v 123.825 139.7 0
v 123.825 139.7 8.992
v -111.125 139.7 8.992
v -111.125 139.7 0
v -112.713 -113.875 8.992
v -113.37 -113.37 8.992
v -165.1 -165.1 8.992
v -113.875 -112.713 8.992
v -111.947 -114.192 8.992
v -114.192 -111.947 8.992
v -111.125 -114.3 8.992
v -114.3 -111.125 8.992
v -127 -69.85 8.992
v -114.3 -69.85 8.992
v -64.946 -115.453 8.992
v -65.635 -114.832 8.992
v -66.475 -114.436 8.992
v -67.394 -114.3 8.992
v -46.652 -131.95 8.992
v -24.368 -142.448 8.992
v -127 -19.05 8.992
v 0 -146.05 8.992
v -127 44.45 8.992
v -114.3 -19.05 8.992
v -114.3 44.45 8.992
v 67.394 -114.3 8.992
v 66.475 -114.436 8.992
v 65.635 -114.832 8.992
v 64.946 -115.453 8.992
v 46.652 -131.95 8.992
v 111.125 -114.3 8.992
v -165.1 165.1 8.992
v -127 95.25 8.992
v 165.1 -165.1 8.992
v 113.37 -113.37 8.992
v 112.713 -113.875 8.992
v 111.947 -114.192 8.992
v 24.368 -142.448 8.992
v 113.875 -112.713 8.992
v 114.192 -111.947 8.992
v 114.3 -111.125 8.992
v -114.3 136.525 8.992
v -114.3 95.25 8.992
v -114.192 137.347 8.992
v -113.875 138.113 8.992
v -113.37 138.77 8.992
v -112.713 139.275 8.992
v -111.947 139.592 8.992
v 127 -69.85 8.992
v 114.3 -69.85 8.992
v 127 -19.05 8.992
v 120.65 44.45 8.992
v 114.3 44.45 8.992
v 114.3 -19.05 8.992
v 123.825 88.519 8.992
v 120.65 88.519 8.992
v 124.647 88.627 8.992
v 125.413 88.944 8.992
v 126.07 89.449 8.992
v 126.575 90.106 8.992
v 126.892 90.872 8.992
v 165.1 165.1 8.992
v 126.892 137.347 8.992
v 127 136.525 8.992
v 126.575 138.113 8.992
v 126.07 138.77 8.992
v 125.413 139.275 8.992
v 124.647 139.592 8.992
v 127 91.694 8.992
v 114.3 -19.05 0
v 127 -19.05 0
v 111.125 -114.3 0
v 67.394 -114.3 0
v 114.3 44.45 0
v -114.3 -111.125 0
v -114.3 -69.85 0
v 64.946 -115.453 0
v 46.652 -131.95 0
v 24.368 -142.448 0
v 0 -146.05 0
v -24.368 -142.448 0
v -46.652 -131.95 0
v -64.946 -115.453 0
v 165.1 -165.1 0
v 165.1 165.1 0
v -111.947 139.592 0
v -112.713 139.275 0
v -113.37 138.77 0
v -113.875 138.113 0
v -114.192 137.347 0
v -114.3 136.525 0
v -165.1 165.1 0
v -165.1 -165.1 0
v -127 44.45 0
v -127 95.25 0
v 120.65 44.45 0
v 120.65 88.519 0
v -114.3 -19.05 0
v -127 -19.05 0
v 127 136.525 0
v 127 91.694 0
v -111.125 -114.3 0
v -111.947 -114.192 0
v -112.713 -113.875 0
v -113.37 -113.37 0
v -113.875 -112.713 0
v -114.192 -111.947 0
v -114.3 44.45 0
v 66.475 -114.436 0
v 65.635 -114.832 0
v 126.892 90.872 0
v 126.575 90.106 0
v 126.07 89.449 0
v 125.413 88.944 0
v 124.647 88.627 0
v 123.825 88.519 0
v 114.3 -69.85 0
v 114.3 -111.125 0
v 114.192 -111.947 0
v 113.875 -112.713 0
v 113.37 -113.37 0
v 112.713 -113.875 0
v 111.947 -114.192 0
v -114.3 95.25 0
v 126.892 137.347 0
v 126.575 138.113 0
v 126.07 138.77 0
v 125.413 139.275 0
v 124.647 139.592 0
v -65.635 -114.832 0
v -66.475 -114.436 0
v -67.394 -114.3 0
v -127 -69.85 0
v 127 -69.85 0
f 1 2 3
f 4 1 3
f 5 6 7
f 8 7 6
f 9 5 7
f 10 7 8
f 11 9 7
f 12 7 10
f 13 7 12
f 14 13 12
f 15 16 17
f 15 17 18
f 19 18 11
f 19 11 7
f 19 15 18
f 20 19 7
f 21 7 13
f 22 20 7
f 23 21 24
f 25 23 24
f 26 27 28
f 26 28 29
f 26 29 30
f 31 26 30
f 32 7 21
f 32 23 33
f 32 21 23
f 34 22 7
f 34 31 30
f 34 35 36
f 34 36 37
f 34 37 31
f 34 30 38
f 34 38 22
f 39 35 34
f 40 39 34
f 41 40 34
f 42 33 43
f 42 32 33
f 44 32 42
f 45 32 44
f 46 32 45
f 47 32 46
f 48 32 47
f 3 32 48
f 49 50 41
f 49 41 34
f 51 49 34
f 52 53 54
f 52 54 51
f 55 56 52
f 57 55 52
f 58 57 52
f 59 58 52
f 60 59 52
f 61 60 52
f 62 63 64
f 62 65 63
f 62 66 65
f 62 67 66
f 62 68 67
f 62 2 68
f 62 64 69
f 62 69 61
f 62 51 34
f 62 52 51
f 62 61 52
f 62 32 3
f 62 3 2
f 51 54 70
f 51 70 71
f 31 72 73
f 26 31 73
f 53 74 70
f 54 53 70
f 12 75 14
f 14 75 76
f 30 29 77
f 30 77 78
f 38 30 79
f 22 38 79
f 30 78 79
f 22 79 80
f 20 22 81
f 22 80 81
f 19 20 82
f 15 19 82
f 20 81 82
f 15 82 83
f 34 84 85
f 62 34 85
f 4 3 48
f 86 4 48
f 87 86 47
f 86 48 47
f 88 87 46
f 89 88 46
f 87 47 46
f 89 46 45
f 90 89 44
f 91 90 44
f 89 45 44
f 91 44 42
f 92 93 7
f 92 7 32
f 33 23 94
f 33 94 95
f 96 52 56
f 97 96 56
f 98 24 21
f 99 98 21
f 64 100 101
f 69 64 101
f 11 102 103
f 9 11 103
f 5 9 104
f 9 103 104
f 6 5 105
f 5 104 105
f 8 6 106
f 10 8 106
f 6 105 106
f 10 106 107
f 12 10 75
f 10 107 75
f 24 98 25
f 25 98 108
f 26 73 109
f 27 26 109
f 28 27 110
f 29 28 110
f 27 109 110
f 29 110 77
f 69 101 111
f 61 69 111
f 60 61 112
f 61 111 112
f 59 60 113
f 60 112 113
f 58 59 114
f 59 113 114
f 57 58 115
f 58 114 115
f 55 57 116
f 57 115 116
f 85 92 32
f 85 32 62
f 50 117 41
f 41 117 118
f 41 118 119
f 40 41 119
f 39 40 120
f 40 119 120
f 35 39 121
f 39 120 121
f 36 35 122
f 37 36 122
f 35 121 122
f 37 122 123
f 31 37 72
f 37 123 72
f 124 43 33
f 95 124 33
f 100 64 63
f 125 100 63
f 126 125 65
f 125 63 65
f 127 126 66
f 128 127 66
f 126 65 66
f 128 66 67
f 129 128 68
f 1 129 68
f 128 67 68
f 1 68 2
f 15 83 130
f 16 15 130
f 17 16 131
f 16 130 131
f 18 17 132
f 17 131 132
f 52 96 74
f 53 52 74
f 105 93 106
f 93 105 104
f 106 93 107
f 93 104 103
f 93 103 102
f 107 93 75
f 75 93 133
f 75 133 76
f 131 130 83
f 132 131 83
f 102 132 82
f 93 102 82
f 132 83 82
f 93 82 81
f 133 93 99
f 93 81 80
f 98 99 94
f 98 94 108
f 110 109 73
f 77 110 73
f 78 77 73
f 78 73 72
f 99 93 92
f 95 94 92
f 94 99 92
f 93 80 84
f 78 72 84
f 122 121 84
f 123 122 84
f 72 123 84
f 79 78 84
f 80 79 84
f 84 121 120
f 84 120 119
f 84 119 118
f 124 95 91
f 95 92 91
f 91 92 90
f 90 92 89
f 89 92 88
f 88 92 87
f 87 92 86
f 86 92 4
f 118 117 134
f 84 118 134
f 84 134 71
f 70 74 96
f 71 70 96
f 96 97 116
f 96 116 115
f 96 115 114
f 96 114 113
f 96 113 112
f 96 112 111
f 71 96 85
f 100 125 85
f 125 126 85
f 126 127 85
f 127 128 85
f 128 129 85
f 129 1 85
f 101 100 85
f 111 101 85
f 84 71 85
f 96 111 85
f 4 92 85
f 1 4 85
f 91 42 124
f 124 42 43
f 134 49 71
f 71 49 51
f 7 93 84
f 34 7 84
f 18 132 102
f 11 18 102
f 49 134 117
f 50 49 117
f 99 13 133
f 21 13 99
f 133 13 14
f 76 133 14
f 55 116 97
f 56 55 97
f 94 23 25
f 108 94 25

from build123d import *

# Parameters (mm, degrees)
F1_DEPTH      = 8.89
F3_DEPTH      = 4.9276
F3_DEPTH_BACK = 2.54
F7_DEPTH      = 13.6535
F8_W          = 330.2
F8_H          = 330.2
F9_DEPTH      = 8.9916
F13_DEPTH     = 25.4
F15_DEPTH     = 8.9926
F16_W         = 7.7724
F16_H         = 50.8
F16_W_2       = 1.4224
F16_H_2       = 44.069
F17_DEPTH     = 8.9926


with BuildPart() as f1:
    # F0 (on Top) → F1 (new body)
    with BuildSketch(Plane.XY):
        with BuildLine():
            Line((67.3940027121, -114.3), (111.125, -114.3))
            ThreePointArc((111.125, -114.3), (113.3700640303, -113.3700640303), (114.3, -111.125))
            Line((114.3, -111.125), (114.3, 85.344))
            ThreePointArc((114.3, 85.344), (115.2299359697, 87.5890640303), (117.475, 88.519))
            Line((117.475, 88.519), (123.825, 88.519))
            ThreePointArc((123.825, 88.519), (126.0700640303, 89.4489359697), (127, 91.694))
            Line((127, 91.694), (127, 111.125))
            ThreePointArc((127, 111.125), (126.0700640303, 113.3700640303), (123.825, 114.3))
            Line((123.825, 114.3), (114.3, 114.3))
            Line((114.3, 114.3), (-111.125, 114.3))
            ThreePointArc((-111.125, 114.3), (-113.3700640303, 113.3700640303), (-114.3, 111.125))
            Line((-114.3, 111.125), (-114.3, -111.125))
            ThreePointArc((-114.3, -111.125), (-113.3700640303, -113.3700640303), (-111.125, -114.3))
            Line((-111.125, -114.3), (-67.3940027121, -114.3))
            ThreePointArc((-67.3940027121, -114.3), (-66.0408699293, -114.6027784431), (-64.9458155322, -115.4533658758))
            ThreePointArc((-64.9458155322, -115.4533658758), (0, -146.05), (64.9458155322, -115.4533658758))
            ThreePointArc((64.9458155322, -115.4533658758), (66.0408699293, -114.6027784431), (67.3940027121, -114.3))
        make_face()
    extrude(amount=F1_DEPTH)

    # F2 (on face) → F3 (join, two sides)
    with BuildSketch(Plane.YZ.offset(114.3)) as f3_sk:
        Polygon((50.8, -3.175), (66.675, -3.175), (69.85, -4.7625), (69.85, -1.9226936686), (67.2746126628, -0.635), (51.3996126628, -0.635), (50.1296126628, 0), (44.45, 0), align=None)
        Polygon((44.45, 2.8398063314), (44.45, 0), (50.1296126628, 0), align=None)
    extrude(amount=F3_DEPTH)
    extrude(f3_sk.sketch, amount=-F3_DEPTH_BACK)


with BuildPart() as f4_1:
    # F4: copy of F1
    add(f1.part.moved(Location((0, -114.3, 0))))


with BuildPart() as f1_1:
    add(f1.part)

    add(f4_1.part)  # F5 merges F4_1
    # F5: F1, F4_1 across plane
    add(f1.part.mirror(Plane.YZ))
    add(f4_1.part.mirror(Plane.YZ))

    # F6 (on face) → F7 (cut, through all)
    with BuildSketch(Plane.XY.offset(8.89)):
        with BuildLine():
            Line((33.2011497354, -114.3), (-33.2011497354, -114.3))
            ThreePointArc((-33.2011497354, -114.3), (-37.5757853229, -117.1799565804), (-36.6596028328, -122.33671875))
            ThreePointArc((-36.6596028328, -122.33671875), (0, -138.1125), (36.6596028328, -122.33671875))
            ThreePointArc((36.6596028328, -122.33671875), (37.5757853229, -117.1799565804), (33.2011497354, -114.3))
        make_face()
    extrude(amount=-F7_DEPTH, mode=Mode.SUBTRACT)


with BuildPart() as f9:
    # F8 (on Top) → F9 (new body)
    with BuildSketch(Plane.XY):
        Rectangle(F8_W, F8_H)
        with BuildLine():
            ThreePointArc((-114.3, 111.125), (-113.3700640303, 113.3700640303), (-111.125, 114.3))
            Line((-111.125, 114.3), (123.825, 114.3))
            ThreePointArc((123.825, 114.3), (126.0700640303, 113.3700640303), (127, 111.125))
            Line((127, 111.125), (127, 91.694))
            ThreePointArc((127, 91.694), (126.0700640303, 89.4489359697), (123.825, 88.519))
            Line((123.825, 88.519), (117.475, 88.519))
            ThreePointArc((117.475, 88.519), (115.2299359697, 87.5890640303), (114.3, 85.344))
            Line((114.3, 85.344), (114.3, 69.85))
            Line((114.3, 69.85), (119.2276, 69.85))
            Line((119.2276, 69.85), (119.2276, 67.2746126628))
            Line((119.2276, 67.2746126628), (119.2276, 51.3996126628))
            Line((119.2276, 51.3996126628), (119.2276, 44.45))
            Line((119.2276, 44.45), (114.3, 44.45))
            Line((114.3, 44.45), (114.3, -44.45))
            Line((114.3, -44.45), (119.2276, -44.45))
            Line((119.2276, -44.45), (119.2276, -47.0253873372))
            Line((119.2276, -47.0253873372), (119.2276, -62.9003873372))
            Line((119.2276, -62.9003873372), (119.2276, -69.85))
            Line((119.2276, -69.85), (114.3, -69.85))
            Line((114.3, -69.85), (114.3, -111.125))
            ThreePointArc((114.3, -111.125), (113.3700640303, -113.3700640303), (111.125, -114.3))
            Line((111.125, -114.3), (67.3940027121, -114.3))
            ThreePointArc((67.3940027121, -114.3), (66.0408699293, -114.6027784431), (64.9458155322, -115.4533658758))
            ThreePointArc((64.9458155322, -115.4533658758), (0, -146.05), (-64.9458155322, -115.4533658758))
            ThreePointArc((-64.9458155322, -115.4533658758), (-66.0408699293, -114.6027784431), (-67.3940027121, -114.3))
            Line((-67.3940027121, -114.3), (-111.125, -114.3))
            ThreePointArc((-111.125, -114.3), (-113.3700640303, -113.3700640303), (-114.3, -111.125))
            Line((-114.3, -111.125), (-114.3, -69.85))
            Line((-114.3, -69.85), (-119.2276, -69.85))
            Line((-119.2276, -69.85), (-119.2276, -62.9003873372))
            Line((-119.2276, -62.9003873372), (-119.2276, -47.0253873372))
            Line((-119.2276, -47.0253873372), (-119.2276, -44.45))
            Line((-119.2276, -44.45), (-114.3, -44.45))
            Line((-114.3, -44.45), (-114.3, 44.45))
            Line((-114.3, 44.45), (-119.2276, 44.45))
            Line((-119.2276, 44.45), (-119.2276, 51.3996126628))
            Line((-119.2276, 51.3996126628), (-119.2276, 67.2746126628))
            Line((-119.2276, 67.2746126628), (-119.2276, 69.85))
            Line((-119.2276, 69.85), (-114.3, 69.85))
            Line((-114.3, 69.85), (-114.3, 111.125))
        make_face(mode=Mode.SUBTRACT)
    extrude(amount=F9_DEPTH)

    # F11 (on face) → F13 (cut)
    with BuildSketch(Plane.XY.offset(8.9916)):
        with BuildLine():
            ThreePointArc((123.825, 114.3), (124.3749261314, 114.2520123521), (124.9082288539, 114.1095))
            ThreePointArc((124.9082288539, 114.1095), (126.4249881357, 115.2717248577), (127, 117.094))
            Line((127, 117.094), (127, 136.525))
            ThreePointArc((127, 136.525), (126.0700640303, 138.7700640303), (123.825, 139.7))
            Line((123.825, 139.7), (-111.125, 139.7))
            ThreePointArc((-111.125, 139.7), (-113.3700640303, 138.7700640303), (-114.3, 136.525))
            Line((-114.3, 136.525), (-114.3, 111.125))
            ThreePointArc((-114.3, 111.125), (-113.3700640303, 113.3700640303), (-111.125, 114.3))
            Line((-111.125, 114.3), (123.825, 114.3))
        make_face()
        Polygon((-114.3, 69.85), (-114.3, 95.25), (-119.2276, 95.25), (-119.2276, 92.6746126628), (-119.2276, 76.7996126628), (-119.2276, 69.85), align=None)
        Polygon((-114.3, -44.45), (-114.3, -19.05), (-119.2276, -19.05), (-119.2276, -21.6253873372), (-119.2276, -37.5003873372), (-119.2276, -44.45), align=None)
        Polygon((119.2276, -19.05), (114.3, -19.05), (114.3, -44.45), (119.2276, -44.45), (119.2276, -37.5003873372), (119.2276, -21.6253873372), align=None)
        with BuildLine():
            ThreePointArc((117.475, 88.519), (115.2299359697, 87.5890640303), (114.3, 85.344))
            Line((114.3, 85.344), (114.3, 69.85))
            Line((114.3, 69.85), (119.2276, 69.85))
            Line((119.2276, 69.85), (119.2276, 76.7996126628))
            Line((119.2276, 76.7996126628), (119.2276, 88.519))
            Line((119.2276, 88.519), (117.475, 88.519))
        make_face()
    extrude(amount=-F13_DEPTH, mode=Mode.SUBTRACT)

    # F14 (on face) → F15 (cut, through all)
    with BuildSketch(Plane.XY.offset(8.9916)):
        with BuildLine():
            Line((127, 111.125), (127, 117.094))
            ThreePointArc((127, 117.094), (126.4249881357, 115.2717248577), (124.9082288539, 114.1095))
            ThreePointArc((124.9082288539, 114.1095), (126.4249881357, 112.9472751423), (127, 111.125))
        make_face()
    extrude(amount=-F15_DEPTH, mode=Mode.SUBTRACT)

    # F16 (on face) → F17 (cut, through all)
    with BuildSketch(Plane.XY.offset(8.9916)):
        with Locations((-123.1138, 69.85)):
            Rectangle(F16_W, F16_H)
        with Locations((-123.1138, -44.45)):
            Rectangle(F16_W, F16_H)
        with Locations((123.1138, -44.45)):
            Rectangle(F16_W, F16_H)
        with Locations((119.9388, 66.4845)):
            Rectangle(F16_W_2, F16_H_2)
    extrude(amount=-F17_DEPTH, mode=Mode.SUBTRACT)


with BuildPart() as f1_2:
    # F10: moved
    add(f1_1.part.moved(Location((0, 25.4, 0))))


solid = f9.part
